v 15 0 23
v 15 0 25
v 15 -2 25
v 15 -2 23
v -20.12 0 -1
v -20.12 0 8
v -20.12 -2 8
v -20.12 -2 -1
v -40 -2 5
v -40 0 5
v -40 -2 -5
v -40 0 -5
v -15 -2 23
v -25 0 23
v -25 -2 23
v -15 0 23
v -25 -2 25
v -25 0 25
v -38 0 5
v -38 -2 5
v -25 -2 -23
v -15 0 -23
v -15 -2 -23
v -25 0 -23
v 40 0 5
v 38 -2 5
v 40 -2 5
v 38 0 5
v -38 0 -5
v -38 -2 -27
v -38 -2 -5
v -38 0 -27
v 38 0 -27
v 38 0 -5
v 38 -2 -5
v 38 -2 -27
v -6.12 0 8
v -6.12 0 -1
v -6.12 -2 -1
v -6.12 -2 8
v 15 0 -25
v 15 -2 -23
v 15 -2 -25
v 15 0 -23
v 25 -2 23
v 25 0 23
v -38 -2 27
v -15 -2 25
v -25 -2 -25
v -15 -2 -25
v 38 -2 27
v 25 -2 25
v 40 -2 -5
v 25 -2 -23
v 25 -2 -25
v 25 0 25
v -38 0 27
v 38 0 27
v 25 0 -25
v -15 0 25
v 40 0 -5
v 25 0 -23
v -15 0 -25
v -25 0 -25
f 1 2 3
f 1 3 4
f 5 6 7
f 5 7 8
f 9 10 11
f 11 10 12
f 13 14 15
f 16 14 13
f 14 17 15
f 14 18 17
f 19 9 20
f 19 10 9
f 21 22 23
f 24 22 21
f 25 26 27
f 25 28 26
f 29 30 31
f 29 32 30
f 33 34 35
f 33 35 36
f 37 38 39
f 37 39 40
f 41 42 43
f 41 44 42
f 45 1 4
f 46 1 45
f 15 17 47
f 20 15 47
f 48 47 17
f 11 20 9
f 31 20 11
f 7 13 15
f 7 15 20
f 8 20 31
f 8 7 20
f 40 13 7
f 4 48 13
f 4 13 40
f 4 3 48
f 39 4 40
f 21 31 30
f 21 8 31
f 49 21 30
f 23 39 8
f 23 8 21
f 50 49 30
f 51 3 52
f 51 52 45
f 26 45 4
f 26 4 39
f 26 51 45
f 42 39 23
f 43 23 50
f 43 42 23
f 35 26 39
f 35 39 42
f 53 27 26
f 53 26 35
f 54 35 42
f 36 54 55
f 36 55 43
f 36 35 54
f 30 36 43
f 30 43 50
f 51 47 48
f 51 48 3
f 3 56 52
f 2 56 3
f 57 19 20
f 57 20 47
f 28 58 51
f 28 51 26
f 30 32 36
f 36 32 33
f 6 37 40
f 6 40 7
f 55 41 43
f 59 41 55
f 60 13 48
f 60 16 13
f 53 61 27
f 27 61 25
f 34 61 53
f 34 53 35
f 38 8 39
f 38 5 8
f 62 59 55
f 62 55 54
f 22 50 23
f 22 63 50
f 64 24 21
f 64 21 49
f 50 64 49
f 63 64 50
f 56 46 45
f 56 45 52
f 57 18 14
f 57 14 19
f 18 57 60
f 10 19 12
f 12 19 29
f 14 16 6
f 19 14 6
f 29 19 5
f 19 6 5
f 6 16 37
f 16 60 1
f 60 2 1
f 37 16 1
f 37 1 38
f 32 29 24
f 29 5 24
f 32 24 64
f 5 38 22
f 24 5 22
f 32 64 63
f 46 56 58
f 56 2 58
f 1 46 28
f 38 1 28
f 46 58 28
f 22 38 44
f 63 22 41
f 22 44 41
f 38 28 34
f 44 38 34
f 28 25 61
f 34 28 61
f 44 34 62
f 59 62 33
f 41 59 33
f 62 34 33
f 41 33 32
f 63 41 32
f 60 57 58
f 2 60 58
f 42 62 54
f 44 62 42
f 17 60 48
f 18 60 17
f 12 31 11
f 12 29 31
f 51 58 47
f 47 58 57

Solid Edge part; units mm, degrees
sketch "Sketch1" plane through (0, 0, 0) normal (0, -1, 0) x (1, 0, 0)
  line L0 (40, -27) -> (40, 27)
  line L1 (40, 27) -> (-40, 27)
  line L2 (-40, 27) -> (-40, -27)
  line L3 (-40, -27) -> (40, -27)
extrude "Protrusion1" add sketch "Sketch1" along normal blind 2
sketch "Sketch2" plane through (0, 0, 0) normal (0, -1, 0) x (1, 0, 0)
  line L0 (-25, 23) -> (-15, 23)
  line L1 (-15, 23) -> (-15, 25)
  line L2 (-15, 25) -> (-25, 25)
  line L3 (-25, 25) -> (-25, 23)
extrude "ExtrudedCutout_1" cut sketch "Sketch2" along normal blind 2
sketch "Sketch3" plane through (0, 0, 0) normal (0, -1, 0) x (1, 0, 0)
  line L0 (25, 25) -> (15, 25)
  line L1 (15, 25) -> (15, 23)
  line L2 (15, 23) -> (25, 23)
  line L3 (25, 23) -> (25, 25)
extrude "ExtrudedCutout_2" cut sketch "Sketch3" along normal blind 2
sketch "Sketch4" plane through (0, 0, 0) normal (0, -1, 0) x (1, 0, 0)
  line L0 (15, -25) -> (25, -25)
  line L1 (25, -25) -> (25, -23)
  line L2 (25, -23) -> (15, -23)
  line L3 (15, -23) -> (15, -25)
extrude "ExtrudedCutout_3" cut sketch "Sketch4" along normal blind 2
sketch "Sketch5" plane through (0, 0, 0) normal (0, -1, 0) x (1, 0, 0)
  line L0 (-15, -23) -> (-25, -23)
  line L1 (-25, -23) -> (-25, -25)
  line L2 (-25, -25) -> (-15, -25)
  line L3 (-15, -25) -> (-15, -23)
extrude "ExtrudedCutout_4" cut sketch "Sketch5" along normal blind 2
sketch "Sketch6" plane through (0, 0, 0) normal (0, -1, 0) x (1, 0, 0)
  line L0 (-38, -27) -> (-38, -5)
  line L1 (-38, -5) -> (-40, -5)
  line L2 (-40, -5) -> (-40, -27)
  line L3 (-40, -27) -> (-38, -27)
extrude "ExtrudedCutout_5" cut sketch "Sketch6" along normal blind 2
sketch "Sketch7" plane through (0, 0, 0) normal (0, -1, 0) x (1, 0, 0)
  line L0 (-38, 5) -> (-38, 27)
  line L1 (-38, 27) -> (-40, 27)
  line L2 (-40, 27) -> (-40, 5)
  line L3 (-40, 5) -> (-38, 5)
extrude "ExtrudedCutout_6" cut sketch "Sketch7" along normal blind 2
sketch "Sketch8" plane through (0, 0, 0) normal (0, -1, 0) x (1, 0, 0)
  line L0 (38, -5) -> (38, -27)
  line L1 (38, -27) -> (40, -27)
  line L2 (40, -27) -> (40, -5)
  line L3 (40, -5) -> (38, -5)
extrude "ExtrudedCutout_7" cut sketch "Sketch8" along normal blind 2
sketch "Sketch9" plane through (0, 0, 0) normal (0, -1, 0) x (1, 0, 0)
  line L0 (38, 27) -> (38, 5)
  line L1 (38, 5) -> (40, 5)
  line L2 (40, 5) -> (40, 27)
  line L3 (40, 27) -> (38, 27)
extrude "ExtrudedCutout_8" cut sketch "Sketch9" along normal blind 2
sketch "Sketch10" plane through (0, 0, 0) normal (0, -1, 0) x (1, 0, 0)
  line L0 (-20.12, -1) -> (-6.12, -1)
  line L1 (-6.12, -1) -> (-6.12, 8)
  line L2 (-6.12, 8) -> (-20.12, 8)
  line L3 (-20.12, 8) -> (-20.12, -1)
extrude "ExtrudedCutout_9" cut sketch "Sketch10" along normal blind 2
properties material "Acrylic, high impact grade"
